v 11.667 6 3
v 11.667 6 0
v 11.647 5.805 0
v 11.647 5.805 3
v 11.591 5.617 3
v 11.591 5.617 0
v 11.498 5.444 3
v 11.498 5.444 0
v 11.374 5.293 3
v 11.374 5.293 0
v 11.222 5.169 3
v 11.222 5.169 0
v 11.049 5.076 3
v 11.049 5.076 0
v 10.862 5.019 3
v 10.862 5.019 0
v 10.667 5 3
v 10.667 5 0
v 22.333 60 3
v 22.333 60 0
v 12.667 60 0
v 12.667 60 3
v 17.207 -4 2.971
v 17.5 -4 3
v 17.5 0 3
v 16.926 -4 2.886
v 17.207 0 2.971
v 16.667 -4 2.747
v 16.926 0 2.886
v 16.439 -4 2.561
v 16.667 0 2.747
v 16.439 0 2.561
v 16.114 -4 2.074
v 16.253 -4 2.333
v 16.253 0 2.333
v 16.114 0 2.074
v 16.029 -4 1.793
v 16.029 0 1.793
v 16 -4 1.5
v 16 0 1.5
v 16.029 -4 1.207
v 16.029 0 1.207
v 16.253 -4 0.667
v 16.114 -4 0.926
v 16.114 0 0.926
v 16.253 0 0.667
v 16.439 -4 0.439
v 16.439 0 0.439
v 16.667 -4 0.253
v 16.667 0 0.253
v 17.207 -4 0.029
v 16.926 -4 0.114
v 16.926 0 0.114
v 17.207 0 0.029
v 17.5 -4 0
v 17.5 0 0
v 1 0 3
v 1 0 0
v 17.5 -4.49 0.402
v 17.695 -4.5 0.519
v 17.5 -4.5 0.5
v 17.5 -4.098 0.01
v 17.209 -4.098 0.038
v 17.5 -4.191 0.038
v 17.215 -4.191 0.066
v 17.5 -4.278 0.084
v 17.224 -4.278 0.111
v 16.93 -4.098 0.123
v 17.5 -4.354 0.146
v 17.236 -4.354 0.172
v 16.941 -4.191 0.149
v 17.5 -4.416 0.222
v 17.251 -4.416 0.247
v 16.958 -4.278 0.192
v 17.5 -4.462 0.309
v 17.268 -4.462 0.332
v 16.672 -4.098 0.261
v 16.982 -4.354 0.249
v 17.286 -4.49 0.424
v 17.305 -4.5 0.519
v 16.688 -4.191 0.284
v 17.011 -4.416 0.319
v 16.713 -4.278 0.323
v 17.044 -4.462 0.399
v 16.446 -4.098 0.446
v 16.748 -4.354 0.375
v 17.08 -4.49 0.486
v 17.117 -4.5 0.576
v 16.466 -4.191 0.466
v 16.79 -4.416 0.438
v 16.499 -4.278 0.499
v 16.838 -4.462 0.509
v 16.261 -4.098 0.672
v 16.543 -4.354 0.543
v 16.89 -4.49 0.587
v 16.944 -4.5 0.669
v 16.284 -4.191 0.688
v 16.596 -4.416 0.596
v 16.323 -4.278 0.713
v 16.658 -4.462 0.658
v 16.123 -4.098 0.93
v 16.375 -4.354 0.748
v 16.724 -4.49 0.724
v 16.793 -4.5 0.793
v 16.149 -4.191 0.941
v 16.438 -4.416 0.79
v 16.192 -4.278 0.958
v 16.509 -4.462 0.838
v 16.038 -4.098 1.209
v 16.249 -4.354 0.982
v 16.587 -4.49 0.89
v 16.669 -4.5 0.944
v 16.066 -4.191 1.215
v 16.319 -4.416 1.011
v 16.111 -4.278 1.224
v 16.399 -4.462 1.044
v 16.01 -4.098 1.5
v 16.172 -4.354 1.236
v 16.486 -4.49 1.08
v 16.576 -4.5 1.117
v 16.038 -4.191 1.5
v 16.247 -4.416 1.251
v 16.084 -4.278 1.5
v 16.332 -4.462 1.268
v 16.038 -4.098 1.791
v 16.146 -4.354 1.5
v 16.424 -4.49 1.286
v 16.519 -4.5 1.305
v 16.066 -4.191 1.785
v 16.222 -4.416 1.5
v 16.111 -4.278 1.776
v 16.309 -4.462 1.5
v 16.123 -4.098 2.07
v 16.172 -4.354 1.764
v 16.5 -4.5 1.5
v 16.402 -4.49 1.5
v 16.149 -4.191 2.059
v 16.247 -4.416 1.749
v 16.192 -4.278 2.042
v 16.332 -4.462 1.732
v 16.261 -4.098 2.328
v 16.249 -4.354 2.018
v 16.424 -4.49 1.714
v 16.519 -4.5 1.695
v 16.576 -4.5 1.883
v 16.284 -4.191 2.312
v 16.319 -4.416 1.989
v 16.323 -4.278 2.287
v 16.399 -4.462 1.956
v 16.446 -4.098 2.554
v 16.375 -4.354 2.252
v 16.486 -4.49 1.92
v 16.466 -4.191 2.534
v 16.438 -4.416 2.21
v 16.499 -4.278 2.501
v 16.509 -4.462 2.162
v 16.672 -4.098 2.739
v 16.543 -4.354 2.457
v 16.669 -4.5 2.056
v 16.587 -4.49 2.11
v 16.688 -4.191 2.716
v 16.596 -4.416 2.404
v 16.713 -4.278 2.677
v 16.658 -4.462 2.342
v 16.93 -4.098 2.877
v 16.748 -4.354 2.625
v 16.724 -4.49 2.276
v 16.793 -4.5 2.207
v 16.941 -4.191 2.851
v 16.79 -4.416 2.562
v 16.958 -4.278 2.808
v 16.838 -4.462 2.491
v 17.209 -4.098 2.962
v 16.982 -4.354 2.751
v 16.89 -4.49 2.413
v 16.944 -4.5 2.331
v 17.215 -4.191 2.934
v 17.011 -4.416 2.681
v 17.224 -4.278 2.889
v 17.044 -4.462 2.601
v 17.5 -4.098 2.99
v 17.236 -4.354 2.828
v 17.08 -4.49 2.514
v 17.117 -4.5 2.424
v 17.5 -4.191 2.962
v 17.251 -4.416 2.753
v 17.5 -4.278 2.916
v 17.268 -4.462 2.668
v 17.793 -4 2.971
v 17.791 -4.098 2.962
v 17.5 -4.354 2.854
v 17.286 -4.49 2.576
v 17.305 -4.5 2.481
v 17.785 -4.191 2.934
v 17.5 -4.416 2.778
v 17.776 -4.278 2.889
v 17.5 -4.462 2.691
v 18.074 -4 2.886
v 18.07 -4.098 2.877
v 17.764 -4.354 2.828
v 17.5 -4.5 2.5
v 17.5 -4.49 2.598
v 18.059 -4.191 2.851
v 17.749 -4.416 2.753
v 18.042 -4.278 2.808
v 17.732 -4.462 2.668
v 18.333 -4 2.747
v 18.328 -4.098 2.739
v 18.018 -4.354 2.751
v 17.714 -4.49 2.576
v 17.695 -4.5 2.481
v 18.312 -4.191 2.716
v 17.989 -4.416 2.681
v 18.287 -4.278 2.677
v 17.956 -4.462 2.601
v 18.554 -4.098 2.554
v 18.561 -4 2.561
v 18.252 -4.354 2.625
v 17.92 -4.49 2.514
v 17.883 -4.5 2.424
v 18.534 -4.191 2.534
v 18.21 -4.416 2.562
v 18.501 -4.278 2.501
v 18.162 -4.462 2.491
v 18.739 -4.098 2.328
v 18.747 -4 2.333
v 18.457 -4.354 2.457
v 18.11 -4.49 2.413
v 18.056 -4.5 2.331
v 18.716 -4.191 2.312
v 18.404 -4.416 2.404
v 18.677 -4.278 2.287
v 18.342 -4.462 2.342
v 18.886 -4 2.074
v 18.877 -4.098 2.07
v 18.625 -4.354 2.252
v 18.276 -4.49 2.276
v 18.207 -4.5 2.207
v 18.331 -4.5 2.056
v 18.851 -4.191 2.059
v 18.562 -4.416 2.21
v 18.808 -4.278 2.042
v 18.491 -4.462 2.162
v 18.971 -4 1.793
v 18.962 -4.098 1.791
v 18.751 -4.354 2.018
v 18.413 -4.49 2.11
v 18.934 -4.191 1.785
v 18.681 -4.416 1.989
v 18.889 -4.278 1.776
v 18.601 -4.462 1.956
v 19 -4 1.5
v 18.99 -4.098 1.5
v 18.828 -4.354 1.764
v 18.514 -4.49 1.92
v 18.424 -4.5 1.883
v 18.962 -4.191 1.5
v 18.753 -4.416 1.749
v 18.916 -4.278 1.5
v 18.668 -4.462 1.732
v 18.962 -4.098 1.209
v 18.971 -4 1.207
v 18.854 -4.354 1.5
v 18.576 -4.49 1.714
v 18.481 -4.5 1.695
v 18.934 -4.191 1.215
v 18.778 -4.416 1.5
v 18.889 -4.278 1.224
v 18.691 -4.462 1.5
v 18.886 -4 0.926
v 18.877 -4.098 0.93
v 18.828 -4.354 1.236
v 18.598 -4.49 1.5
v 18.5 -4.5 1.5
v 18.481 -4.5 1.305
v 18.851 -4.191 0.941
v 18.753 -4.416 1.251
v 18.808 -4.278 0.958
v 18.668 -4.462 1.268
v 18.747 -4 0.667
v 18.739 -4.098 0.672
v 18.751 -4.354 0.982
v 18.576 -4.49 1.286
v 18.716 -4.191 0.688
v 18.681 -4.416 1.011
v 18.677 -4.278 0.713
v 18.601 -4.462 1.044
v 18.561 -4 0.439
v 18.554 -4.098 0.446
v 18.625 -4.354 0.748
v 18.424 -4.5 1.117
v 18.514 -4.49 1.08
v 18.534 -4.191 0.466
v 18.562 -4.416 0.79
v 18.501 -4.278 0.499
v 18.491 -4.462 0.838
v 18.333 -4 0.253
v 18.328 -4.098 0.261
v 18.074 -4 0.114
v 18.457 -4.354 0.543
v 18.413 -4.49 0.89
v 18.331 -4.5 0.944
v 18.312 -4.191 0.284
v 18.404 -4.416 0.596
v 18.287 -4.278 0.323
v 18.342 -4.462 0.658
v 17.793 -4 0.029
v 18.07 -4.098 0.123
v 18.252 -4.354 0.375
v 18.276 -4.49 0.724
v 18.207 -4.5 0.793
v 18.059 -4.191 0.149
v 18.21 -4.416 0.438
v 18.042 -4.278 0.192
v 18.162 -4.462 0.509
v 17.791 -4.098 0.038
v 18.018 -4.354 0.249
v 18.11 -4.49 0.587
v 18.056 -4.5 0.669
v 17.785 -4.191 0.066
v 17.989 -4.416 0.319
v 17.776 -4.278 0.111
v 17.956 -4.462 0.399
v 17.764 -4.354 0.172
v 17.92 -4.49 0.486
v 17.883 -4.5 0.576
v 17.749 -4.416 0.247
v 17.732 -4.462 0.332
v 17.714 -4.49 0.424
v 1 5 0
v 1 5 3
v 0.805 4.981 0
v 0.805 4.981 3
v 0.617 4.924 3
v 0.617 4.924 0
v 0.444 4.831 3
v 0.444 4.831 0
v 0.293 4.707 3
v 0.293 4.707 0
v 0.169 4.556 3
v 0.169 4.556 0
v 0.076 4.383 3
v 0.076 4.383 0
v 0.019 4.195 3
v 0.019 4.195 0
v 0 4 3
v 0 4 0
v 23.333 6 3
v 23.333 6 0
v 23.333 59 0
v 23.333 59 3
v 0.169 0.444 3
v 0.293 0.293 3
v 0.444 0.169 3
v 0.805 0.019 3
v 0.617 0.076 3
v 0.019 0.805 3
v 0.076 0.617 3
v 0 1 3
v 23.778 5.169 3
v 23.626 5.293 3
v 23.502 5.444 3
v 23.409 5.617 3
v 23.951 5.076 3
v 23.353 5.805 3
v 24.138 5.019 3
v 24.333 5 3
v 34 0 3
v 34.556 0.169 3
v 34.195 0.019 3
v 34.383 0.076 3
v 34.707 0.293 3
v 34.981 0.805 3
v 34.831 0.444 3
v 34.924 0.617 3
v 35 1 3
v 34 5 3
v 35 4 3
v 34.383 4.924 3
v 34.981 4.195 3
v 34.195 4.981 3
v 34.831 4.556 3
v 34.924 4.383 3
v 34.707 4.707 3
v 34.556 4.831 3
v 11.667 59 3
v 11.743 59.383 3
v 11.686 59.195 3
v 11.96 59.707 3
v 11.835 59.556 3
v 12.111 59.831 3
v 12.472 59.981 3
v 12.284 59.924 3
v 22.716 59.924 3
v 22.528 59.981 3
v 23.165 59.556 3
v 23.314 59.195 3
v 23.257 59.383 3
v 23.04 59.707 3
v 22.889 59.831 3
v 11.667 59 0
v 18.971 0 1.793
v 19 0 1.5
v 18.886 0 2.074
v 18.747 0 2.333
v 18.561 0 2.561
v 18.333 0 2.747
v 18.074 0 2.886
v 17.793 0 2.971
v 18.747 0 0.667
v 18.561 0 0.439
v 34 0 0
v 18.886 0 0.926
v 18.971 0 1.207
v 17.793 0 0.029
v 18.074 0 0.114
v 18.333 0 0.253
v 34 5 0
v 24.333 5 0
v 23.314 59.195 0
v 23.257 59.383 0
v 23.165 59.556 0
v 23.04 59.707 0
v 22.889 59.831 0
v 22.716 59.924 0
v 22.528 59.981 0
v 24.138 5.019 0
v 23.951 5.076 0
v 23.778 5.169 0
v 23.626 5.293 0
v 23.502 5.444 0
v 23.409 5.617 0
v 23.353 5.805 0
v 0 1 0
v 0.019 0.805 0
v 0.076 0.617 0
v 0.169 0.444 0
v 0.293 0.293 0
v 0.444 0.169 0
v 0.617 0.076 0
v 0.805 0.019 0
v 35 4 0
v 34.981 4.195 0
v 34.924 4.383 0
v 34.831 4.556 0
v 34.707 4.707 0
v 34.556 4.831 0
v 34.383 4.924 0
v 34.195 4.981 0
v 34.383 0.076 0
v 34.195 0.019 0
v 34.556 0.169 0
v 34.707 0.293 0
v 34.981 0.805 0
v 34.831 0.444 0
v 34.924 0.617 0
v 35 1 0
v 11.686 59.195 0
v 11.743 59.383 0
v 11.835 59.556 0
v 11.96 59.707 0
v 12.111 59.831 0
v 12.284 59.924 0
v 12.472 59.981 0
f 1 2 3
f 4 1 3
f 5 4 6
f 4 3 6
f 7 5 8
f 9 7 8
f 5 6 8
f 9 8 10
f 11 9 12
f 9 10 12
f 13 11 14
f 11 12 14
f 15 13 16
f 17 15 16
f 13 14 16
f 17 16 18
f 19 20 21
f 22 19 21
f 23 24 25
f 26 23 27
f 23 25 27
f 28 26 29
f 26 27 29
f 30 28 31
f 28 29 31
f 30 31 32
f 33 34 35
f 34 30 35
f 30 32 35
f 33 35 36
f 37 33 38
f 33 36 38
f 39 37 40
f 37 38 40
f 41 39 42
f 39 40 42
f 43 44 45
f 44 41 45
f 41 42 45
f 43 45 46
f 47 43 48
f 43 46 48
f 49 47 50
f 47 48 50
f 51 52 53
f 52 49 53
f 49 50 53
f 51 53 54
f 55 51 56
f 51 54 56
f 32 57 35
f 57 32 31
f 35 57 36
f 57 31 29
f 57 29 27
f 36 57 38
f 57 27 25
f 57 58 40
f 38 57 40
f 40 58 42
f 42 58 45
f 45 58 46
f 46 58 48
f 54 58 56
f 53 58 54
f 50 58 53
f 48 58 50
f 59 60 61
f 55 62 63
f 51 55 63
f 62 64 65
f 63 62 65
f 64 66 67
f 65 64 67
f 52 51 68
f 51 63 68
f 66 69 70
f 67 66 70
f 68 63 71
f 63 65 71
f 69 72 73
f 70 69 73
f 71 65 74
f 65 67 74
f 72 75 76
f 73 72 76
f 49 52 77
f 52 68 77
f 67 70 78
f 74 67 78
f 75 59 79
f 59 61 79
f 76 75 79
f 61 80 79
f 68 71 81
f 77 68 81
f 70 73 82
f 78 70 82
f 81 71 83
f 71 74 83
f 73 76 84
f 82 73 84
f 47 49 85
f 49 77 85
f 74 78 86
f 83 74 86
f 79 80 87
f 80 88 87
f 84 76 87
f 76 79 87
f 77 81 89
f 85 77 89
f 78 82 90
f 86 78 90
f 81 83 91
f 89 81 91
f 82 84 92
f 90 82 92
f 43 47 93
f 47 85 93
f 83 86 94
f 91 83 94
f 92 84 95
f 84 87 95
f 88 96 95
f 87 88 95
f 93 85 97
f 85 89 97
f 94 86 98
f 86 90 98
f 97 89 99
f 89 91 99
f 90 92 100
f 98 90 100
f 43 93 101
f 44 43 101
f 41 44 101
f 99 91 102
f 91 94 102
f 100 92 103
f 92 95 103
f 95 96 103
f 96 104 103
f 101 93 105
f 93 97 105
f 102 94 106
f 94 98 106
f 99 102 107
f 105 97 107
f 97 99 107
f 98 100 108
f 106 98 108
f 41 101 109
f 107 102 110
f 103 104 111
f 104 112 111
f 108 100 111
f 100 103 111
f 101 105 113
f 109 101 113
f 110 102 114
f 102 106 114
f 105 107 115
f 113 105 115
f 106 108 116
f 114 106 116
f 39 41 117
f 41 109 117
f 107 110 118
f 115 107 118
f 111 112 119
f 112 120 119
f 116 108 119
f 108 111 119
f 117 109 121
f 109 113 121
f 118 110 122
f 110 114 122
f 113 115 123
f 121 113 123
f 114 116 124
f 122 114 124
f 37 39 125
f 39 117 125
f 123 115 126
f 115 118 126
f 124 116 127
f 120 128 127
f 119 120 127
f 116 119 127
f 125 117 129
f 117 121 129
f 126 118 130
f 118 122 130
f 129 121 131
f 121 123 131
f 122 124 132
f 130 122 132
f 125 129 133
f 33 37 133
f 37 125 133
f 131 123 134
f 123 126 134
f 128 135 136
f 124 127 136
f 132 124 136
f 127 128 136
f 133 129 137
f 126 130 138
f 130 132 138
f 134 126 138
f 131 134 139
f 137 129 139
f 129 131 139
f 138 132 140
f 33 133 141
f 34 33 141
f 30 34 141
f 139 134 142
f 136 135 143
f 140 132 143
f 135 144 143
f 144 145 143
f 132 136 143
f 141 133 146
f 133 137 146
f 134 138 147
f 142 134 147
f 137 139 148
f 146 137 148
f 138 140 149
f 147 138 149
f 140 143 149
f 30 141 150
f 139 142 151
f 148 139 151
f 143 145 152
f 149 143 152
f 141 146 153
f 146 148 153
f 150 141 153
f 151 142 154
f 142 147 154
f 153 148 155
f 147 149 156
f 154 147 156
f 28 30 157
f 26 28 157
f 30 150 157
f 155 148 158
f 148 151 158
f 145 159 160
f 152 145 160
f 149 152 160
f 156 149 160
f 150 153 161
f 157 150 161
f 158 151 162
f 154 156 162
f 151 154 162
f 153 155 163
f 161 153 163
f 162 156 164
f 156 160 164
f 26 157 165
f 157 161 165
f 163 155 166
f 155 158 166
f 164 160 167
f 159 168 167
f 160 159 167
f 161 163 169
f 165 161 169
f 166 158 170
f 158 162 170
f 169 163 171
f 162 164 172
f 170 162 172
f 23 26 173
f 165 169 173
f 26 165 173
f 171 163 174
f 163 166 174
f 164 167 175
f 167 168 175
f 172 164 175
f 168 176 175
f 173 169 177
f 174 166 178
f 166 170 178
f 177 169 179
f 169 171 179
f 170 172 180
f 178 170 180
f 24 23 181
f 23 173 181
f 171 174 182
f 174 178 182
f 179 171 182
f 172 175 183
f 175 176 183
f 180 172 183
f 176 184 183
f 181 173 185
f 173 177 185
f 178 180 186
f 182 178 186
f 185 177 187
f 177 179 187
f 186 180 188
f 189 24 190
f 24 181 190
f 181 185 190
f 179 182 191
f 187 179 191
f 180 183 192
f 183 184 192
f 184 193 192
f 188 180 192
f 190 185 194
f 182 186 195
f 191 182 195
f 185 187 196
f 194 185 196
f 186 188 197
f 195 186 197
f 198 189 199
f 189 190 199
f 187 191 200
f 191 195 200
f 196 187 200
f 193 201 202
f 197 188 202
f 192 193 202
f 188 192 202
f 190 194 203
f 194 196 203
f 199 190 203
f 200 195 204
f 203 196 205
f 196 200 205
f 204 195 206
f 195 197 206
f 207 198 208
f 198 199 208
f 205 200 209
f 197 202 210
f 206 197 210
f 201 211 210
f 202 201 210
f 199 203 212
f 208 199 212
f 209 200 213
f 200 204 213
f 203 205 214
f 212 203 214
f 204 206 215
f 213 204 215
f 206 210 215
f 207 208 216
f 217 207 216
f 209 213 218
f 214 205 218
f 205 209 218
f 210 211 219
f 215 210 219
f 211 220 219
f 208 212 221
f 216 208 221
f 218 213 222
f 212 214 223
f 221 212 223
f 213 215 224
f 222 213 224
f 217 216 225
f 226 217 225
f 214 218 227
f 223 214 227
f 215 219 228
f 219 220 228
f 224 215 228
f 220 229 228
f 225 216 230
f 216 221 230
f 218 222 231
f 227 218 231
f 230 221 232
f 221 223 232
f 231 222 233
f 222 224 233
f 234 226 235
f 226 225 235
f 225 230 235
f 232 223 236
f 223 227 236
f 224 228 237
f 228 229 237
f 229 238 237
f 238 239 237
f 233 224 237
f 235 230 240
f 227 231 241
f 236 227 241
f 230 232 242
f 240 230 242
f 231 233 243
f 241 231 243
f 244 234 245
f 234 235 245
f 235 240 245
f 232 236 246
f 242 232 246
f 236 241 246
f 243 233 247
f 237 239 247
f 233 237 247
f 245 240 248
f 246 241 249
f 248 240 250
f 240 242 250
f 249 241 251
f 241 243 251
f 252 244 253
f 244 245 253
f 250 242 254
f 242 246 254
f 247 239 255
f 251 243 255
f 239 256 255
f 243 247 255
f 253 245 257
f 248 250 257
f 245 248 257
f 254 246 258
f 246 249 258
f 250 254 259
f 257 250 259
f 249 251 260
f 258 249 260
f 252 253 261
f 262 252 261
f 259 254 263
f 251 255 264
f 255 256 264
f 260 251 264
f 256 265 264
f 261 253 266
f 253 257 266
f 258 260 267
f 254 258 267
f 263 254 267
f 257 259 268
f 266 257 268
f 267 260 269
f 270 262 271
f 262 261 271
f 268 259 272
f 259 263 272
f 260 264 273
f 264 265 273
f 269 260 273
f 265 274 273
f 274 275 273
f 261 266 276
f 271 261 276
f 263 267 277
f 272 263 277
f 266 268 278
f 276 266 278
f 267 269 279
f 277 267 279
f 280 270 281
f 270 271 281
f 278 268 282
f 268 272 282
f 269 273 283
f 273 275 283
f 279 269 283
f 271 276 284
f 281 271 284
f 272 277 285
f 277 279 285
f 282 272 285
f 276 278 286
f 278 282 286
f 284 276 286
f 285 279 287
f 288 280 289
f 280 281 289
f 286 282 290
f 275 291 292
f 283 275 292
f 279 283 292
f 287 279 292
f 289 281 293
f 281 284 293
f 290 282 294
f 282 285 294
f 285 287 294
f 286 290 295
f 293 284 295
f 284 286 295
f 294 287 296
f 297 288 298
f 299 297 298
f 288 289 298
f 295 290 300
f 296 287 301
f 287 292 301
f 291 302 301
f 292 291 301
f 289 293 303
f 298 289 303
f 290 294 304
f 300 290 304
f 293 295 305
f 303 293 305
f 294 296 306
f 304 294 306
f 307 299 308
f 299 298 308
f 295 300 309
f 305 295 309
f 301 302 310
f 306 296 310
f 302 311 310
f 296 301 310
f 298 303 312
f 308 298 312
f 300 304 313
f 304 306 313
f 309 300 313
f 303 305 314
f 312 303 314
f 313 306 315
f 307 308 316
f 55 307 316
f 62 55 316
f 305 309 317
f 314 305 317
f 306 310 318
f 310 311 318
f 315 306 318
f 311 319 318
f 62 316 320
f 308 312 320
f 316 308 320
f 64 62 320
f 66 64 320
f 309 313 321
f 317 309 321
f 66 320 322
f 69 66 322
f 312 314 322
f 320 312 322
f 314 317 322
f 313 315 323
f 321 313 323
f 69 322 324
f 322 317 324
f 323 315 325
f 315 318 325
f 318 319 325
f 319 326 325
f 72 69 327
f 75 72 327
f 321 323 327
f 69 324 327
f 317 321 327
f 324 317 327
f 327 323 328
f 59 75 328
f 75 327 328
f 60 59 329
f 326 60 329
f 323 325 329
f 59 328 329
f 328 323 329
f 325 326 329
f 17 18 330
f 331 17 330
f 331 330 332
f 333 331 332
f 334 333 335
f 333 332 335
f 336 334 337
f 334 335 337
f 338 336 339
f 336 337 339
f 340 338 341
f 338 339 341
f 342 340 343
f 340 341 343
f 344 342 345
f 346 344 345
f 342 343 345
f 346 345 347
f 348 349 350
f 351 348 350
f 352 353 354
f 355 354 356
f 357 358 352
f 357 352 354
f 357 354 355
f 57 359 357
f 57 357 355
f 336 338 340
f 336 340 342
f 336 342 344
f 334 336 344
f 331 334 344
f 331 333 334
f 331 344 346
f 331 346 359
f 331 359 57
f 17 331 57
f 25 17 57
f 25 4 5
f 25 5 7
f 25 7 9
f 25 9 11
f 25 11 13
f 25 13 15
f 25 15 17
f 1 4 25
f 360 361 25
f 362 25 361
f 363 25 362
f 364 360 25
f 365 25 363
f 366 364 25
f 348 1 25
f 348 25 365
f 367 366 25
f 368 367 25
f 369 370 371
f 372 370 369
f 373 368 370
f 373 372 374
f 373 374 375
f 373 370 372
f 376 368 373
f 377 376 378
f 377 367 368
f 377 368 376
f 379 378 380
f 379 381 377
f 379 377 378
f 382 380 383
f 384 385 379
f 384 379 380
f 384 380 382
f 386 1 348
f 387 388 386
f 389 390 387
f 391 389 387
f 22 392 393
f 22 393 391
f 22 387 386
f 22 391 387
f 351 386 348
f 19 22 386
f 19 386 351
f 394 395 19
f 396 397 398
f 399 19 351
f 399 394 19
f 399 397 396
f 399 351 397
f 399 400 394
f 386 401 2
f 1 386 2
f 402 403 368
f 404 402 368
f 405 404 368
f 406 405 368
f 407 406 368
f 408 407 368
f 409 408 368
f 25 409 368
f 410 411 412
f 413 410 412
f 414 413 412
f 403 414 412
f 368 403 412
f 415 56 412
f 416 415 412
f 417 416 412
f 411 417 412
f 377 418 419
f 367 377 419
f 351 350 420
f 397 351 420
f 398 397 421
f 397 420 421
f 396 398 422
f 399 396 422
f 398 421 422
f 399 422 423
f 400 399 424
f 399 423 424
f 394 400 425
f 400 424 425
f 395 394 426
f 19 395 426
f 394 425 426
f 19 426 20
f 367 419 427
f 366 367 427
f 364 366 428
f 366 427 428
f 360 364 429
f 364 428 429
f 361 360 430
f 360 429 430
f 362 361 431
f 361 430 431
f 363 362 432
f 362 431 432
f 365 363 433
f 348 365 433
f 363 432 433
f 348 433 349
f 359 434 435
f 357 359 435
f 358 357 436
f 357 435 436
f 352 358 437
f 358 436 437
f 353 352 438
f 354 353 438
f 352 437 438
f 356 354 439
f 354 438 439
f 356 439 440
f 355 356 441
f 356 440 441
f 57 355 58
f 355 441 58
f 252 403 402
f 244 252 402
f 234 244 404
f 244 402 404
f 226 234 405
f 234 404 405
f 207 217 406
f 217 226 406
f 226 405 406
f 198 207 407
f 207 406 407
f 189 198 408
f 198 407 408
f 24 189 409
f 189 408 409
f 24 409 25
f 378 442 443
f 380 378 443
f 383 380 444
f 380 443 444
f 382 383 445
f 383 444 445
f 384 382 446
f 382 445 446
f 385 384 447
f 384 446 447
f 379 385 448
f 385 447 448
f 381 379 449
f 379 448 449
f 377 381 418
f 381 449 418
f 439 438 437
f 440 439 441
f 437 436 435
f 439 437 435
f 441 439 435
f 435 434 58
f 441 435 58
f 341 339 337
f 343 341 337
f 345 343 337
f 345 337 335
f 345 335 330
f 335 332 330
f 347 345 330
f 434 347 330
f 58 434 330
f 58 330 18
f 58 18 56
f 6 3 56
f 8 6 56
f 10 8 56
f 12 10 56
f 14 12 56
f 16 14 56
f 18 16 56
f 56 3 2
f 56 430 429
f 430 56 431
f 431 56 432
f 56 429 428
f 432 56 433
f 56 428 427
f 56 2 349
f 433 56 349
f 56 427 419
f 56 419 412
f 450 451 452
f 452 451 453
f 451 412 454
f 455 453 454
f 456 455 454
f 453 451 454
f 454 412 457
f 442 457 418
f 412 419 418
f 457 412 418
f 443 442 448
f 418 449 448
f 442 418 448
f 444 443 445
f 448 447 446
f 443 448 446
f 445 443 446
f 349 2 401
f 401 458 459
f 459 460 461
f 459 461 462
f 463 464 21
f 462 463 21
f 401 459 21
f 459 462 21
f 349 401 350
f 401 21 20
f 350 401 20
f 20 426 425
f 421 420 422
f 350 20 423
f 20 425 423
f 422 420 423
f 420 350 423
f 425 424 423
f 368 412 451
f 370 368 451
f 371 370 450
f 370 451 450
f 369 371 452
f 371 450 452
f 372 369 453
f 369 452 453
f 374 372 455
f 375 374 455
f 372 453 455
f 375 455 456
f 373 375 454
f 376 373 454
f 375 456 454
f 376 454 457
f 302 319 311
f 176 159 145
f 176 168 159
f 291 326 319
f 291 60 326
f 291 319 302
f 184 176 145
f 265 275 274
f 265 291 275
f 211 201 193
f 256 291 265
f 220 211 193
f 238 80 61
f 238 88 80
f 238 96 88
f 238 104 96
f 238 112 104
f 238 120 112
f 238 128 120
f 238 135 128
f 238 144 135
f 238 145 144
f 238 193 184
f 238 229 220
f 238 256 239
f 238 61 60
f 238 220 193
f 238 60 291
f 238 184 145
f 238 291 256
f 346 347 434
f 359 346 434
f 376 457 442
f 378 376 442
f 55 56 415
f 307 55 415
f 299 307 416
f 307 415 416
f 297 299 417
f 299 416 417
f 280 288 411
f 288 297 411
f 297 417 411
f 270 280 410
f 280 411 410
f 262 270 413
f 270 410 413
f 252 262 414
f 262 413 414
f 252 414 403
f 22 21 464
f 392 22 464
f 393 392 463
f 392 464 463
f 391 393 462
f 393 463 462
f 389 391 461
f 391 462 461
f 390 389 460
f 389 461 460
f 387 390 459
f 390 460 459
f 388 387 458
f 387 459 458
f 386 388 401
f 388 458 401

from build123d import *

# Parameters (mm, degrees)
F4_DEPTH = 3
F6_DEPTH = 4.5


# Not quite as in the source:
# - a fillet or chamfer that OpenCascade refuses, or shapes differently, is made with other operations: its cross-section is extruded or revolved along the edge and cut away or added


with BuildPart() as f4:
    # F3 (on Top) → F4 (new body)
    with BuildSketch(Plane.XY):
        with BuildLine():
            ThreePointArc((0, 1), (0.2928932188, 0.2928932188), (1, 0))
            Line((1, 0), (34, 0))
            ThreePointArc((34, 0), (34.7071067812, 0.2928932188), (35, 1))
            Line((35, 1), (35, 4))
            ThreePointArc((35, 4), (34.7071067812, 4.7071067812), (34, 5))
            Line((34, 5), (24.3333333333, 5))
            ThreePointArc((24.3333333333, 5), (23.6262265521, 5.2928932188), (23.3333333333, 6))
            Line((23.3333333333, 6), (23.3333333333, 59))
            ThreePointArc((23.3333333333, 59), (23.0404401145, 59.7071067812), (22.3333333333, 60))
            Line((22.3333333333, 60), (12.6666666667, 60))
            ThreePointArc((12.6666666667, 60), (11.9595598855, 59.7071067812), (11.6666666667, 59))
            Line((11.6666666667, 59), (11.6666666667, 6))
            ThreePointArc((11.6666666667, 6), (11.3737734479, 5.2928932188), (10.6666666667, 5))
            Line((10.6666666667, 5), (1, 5))
            ThreePointArc((1, 5), (0.2928932188, 4.7071067812), (0, 4))
            Line((0, 4), (0, 1))
        make_face()
    extrude(amount=F4_DEPTH)

    # F5 (on face) → F6 (join)
    with BuildSketch(Plane.XZ):
        with BuildLine():
            ThreePointArc((17.5, 0), (18.5606601718, 0.4393398282), (19, 1.5))
            ThreePointArc((19, 1.5), (18.5606601718, 2.5606601718), (17.5, 3))
            ThreePointArc((17.5, 3), (16, 1.5), (17.5, 0))
        make_face()
    extrude(amount=F6_DEPTH)

    # F7: fillet of radius 0.5 on 1 edges, made by hand

    # F7_s1 → F7_t2 (revolve, cut)
    with BuildSketch(Plane.YZ.offset(17.5)):
        with BuildLine():
            ThreePointArc((-4, 0), (-4.3535533906, 0.1464466094), (-4.5, 0.5))
            Line((-4.5, 0.5), (-4.5, 0))
            Line((-4.5, 0), (-4, 0))
        make_face()
    revolve(axis=Axis((17.5, -4.5, 1.5), (0, 1, 0)), mode=Mode.SUBTRACT)


solid = f4.part
